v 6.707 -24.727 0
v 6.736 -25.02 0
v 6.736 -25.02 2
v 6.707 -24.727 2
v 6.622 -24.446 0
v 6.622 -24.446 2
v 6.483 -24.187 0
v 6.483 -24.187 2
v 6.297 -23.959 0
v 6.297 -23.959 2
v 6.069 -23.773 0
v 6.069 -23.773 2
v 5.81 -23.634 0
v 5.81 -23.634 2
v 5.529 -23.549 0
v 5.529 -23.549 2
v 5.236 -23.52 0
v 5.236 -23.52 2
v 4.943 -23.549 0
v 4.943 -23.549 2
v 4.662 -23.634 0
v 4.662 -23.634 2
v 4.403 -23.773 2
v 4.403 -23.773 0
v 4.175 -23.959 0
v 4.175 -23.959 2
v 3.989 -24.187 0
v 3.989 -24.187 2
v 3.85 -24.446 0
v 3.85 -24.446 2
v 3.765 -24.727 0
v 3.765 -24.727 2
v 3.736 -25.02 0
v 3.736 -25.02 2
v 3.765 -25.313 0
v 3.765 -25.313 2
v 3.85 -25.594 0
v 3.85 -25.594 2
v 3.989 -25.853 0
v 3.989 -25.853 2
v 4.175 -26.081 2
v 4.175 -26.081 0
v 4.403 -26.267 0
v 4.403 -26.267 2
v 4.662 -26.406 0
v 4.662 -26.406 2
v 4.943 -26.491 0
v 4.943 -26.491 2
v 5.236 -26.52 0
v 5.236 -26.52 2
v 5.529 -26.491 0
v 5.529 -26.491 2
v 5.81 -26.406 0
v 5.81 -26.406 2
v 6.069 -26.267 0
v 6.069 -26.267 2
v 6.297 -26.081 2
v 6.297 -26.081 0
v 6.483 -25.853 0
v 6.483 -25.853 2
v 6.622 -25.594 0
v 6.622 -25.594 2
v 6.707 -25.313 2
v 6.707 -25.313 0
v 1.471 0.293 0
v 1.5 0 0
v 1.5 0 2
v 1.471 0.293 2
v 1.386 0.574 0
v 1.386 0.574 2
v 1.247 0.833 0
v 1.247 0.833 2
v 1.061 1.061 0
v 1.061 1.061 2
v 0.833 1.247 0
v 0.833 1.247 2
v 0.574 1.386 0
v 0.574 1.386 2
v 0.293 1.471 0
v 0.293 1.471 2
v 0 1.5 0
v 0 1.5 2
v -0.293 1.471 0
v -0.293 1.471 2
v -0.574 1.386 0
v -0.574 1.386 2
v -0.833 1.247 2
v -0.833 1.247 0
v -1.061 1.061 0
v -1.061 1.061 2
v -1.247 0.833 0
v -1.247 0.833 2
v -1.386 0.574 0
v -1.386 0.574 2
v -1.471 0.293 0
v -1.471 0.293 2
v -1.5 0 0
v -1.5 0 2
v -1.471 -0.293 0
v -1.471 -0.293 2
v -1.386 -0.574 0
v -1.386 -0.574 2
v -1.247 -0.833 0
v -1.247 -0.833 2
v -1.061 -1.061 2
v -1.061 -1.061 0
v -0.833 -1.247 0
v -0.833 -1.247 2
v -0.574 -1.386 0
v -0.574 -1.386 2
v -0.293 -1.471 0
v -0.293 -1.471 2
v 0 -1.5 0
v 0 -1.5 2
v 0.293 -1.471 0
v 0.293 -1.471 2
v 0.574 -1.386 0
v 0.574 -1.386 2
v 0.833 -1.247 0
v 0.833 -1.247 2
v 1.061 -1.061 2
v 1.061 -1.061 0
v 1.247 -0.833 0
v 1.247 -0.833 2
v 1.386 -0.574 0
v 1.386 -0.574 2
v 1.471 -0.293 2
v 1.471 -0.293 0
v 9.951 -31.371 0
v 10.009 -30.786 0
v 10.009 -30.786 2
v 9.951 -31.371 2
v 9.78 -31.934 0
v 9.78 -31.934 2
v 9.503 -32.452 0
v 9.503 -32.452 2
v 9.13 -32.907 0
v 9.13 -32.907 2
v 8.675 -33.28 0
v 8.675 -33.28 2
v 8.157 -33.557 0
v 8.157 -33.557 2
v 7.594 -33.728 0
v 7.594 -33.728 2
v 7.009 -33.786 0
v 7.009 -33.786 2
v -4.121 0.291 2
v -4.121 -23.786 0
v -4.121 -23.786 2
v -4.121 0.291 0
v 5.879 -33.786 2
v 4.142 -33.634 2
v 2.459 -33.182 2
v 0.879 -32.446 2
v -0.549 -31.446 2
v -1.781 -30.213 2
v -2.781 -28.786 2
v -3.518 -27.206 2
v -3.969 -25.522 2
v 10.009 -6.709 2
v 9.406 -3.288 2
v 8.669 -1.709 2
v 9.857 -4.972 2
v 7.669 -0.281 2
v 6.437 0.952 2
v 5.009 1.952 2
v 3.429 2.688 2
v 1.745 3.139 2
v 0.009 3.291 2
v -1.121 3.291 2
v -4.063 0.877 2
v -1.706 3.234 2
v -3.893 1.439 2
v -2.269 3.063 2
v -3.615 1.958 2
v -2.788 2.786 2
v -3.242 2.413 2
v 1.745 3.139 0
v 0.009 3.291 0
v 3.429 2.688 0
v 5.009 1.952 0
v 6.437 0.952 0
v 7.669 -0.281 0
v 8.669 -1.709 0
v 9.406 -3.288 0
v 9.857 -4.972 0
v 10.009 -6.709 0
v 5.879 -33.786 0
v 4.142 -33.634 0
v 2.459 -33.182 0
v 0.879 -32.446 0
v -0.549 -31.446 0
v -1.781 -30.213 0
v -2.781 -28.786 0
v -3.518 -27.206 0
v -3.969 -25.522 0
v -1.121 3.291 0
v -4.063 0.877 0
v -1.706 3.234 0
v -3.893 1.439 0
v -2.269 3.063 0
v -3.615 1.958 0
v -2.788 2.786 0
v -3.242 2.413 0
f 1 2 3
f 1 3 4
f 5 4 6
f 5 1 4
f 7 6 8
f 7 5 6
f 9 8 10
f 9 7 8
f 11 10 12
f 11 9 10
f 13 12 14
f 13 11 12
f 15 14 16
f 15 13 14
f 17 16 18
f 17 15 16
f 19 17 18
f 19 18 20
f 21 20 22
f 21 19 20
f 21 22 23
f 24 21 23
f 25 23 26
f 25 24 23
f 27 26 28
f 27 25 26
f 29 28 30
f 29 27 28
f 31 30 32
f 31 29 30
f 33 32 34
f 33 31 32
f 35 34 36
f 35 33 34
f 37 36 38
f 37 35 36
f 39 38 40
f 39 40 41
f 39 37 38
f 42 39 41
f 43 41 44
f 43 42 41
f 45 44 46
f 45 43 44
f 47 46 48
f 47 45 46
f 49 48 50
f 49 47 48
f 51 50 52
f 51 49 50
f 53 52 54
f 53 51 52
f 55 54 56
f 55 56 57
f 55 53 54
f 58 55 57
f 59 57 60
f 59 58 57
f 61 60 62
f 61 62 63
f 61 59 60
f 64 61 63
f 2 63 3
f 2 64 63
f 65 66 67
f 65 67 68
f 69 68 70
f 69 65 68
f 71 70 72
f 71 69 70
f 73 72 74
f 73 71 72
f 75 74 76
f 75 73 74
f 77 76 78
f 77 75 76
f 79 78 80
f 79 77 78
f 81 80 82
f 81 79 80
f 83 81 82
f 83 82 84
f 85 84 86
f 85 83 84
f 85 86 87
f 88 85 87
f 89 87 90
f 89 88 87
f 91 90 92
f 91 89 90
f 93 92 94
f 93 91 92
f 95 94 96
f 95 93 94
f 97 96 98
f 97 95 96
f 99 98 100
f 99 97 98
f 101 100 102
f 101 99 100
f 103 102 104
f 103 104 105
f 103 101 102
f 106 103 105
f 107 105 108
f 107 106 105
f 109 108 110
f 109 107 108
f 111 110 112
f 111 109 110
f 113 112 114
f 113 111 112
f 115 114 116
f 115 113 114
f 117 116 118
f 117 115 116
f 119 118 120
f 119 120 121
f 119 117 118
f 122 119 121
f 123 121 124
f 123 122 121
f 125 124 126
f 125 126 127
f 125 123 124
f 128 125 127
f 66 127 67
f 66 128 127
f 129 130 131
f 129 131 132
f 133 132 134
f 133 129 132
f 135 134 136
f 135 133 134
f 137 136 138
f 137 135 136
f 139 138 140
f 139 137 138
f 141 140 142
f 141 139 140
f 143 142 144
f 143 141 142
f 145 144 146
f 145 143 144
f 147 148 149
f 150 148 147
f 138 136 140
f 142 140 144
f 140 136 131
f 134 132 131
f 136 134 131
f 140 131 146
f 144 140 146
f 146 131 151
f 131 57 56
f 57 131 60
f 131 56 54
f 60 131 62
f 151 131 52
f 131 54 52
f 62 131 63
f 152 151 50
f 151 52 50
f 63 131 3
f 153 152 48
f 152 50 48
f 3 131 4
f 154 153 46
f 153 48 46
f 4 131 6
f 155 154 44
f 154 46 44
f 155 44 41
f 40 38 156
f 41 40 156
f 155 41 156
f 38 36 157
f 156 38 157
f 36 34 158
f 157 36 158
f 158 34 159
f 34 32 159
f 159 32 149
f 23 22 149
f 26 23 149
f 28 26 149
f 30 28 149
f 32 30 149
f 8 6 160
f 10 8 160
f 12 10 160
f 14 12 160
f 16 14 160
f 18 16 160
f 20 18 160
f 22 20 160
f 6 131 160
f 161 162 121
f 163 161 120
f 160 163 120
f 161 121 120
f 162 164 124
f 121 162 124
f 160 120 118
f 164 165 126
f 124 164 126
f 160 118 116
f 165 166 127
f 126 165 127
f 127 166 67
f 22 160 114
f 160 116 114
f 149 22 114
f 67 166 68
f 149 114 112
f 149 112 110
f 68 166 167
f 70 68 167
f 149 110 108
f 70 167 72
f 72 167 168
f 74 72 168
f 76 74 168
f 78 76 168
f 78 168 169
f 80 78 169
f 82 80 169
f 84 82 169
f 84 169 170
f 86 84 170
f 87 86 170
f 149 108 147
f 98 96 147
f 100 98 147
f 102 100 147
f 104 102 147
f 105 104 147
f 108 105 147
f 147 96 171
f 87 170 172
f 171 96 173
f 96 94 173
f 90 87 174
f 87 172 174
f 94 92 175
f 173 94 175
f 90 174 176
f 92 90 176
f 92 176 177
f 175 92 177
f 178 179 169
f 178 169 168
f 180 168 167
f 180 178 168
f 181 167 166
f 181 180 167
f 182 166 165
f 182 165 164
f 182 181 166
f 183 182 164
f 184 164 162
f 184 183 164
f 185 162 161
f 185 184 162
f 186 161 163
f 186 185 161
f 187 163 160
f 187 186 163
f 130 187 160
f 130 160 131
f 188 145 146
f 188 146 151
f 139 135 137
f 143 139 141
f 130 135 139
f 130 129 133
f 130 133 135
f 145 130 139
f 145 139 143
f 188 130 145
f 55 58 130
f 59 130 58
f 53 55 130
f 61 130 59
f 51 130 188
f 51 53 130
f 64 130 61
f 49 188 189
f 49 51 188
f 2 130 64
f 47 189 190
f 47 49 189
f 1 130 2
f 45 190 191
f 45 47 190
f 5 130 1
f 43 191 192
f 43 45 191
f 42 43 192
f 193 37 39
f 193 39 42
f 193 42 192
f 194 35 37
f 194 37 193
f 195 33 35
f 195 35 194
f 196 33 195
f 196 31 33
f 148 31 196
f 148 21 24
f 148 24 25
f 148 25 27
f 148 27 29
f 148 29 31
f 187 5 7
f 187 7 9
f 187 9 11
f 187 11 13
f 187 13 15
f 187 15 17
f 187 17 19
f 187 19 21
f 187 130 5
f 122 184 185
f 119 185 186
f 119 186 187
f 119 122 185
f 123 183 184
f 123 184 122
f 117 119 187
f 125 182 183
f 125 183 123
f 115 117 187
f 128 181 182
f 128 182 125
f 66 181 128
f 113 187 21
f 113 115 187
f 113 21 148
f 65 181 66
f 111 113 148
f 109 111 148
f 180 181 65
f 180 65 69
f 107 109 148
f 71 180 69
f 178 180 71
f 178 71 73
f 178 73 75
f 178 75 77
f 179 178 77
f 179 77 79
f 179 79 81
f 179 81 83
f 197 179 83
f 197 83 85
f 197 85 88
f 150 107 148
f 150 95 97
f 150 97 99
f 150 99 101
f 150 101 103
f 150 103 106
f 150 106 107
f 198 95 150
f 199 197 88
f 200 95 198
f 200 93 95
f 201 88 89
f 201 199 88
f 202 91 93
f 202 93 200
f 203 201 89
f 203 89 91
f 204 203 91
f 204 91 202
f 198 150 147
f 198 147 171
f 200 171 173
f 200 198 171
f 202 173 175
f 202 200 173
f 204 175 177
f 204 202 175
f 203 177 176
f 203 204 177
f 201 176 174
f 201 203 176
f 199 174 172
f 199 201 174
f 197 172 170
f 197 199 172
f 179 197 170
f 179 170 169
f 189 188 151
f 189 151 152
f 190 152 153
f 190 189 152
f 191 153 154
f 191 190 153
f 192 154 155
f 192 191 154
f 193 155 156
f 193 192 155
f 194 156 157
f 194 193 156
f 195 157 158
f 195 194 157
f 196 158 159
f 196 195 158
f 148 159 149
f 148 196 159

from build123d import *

# Parameters (mm, degrees)
ESBO_O1_R                = 1.5
RESSALTO_EXTRUS_O1_DEPTH = 2


with BuildPart() as part:
    # Esboço1 → Ressalto-extrusão1 (new body)
    with BuildSketch(Plane.XY):
        with BuildLine():
            Line((-1.121038668, 3.291347086), (0.008712569, 3.291347086))
            ThreePointArc((0.008712569, 3.291347086), (7.079780381, 0.362414898), (10.008712569, -6.708652914))
            Line((10.008712569, -6.708652914), (10.008712569, -30.785558293))
            ThreePointArc((10.008712569, -30.785558293), (9.130032913, -32.906878637), (7.008712569, -33.785558293))
            Line((7.008712569, -33.785558293), (5.878961332, -33.785558293))
            ThreePointArc((5.878961332, -33.785558293), (-1.19210648, -30.856626105), (-4.121038668, -23.785558293))
            Line((-4.121038668, -23.785558293), (-4.121038668, 0.291347086))
            ThreePointArc((-4.121038668, 0.291347086), (-3.242359012, 2.41266743), (-1.121038668, 3.291347086))
        make_face()
        Circle(ESBO_O1_R, mode=Mode.SUBTRACT)
        with Locations((5.236066432, -25.02000308)):
            Circle(ESBO_O1_R, mode=Mode.SUBTRACT)
    extrude(amount=RESSALTO_EXTRUS_O1_DEPTH)


solid = part.part
